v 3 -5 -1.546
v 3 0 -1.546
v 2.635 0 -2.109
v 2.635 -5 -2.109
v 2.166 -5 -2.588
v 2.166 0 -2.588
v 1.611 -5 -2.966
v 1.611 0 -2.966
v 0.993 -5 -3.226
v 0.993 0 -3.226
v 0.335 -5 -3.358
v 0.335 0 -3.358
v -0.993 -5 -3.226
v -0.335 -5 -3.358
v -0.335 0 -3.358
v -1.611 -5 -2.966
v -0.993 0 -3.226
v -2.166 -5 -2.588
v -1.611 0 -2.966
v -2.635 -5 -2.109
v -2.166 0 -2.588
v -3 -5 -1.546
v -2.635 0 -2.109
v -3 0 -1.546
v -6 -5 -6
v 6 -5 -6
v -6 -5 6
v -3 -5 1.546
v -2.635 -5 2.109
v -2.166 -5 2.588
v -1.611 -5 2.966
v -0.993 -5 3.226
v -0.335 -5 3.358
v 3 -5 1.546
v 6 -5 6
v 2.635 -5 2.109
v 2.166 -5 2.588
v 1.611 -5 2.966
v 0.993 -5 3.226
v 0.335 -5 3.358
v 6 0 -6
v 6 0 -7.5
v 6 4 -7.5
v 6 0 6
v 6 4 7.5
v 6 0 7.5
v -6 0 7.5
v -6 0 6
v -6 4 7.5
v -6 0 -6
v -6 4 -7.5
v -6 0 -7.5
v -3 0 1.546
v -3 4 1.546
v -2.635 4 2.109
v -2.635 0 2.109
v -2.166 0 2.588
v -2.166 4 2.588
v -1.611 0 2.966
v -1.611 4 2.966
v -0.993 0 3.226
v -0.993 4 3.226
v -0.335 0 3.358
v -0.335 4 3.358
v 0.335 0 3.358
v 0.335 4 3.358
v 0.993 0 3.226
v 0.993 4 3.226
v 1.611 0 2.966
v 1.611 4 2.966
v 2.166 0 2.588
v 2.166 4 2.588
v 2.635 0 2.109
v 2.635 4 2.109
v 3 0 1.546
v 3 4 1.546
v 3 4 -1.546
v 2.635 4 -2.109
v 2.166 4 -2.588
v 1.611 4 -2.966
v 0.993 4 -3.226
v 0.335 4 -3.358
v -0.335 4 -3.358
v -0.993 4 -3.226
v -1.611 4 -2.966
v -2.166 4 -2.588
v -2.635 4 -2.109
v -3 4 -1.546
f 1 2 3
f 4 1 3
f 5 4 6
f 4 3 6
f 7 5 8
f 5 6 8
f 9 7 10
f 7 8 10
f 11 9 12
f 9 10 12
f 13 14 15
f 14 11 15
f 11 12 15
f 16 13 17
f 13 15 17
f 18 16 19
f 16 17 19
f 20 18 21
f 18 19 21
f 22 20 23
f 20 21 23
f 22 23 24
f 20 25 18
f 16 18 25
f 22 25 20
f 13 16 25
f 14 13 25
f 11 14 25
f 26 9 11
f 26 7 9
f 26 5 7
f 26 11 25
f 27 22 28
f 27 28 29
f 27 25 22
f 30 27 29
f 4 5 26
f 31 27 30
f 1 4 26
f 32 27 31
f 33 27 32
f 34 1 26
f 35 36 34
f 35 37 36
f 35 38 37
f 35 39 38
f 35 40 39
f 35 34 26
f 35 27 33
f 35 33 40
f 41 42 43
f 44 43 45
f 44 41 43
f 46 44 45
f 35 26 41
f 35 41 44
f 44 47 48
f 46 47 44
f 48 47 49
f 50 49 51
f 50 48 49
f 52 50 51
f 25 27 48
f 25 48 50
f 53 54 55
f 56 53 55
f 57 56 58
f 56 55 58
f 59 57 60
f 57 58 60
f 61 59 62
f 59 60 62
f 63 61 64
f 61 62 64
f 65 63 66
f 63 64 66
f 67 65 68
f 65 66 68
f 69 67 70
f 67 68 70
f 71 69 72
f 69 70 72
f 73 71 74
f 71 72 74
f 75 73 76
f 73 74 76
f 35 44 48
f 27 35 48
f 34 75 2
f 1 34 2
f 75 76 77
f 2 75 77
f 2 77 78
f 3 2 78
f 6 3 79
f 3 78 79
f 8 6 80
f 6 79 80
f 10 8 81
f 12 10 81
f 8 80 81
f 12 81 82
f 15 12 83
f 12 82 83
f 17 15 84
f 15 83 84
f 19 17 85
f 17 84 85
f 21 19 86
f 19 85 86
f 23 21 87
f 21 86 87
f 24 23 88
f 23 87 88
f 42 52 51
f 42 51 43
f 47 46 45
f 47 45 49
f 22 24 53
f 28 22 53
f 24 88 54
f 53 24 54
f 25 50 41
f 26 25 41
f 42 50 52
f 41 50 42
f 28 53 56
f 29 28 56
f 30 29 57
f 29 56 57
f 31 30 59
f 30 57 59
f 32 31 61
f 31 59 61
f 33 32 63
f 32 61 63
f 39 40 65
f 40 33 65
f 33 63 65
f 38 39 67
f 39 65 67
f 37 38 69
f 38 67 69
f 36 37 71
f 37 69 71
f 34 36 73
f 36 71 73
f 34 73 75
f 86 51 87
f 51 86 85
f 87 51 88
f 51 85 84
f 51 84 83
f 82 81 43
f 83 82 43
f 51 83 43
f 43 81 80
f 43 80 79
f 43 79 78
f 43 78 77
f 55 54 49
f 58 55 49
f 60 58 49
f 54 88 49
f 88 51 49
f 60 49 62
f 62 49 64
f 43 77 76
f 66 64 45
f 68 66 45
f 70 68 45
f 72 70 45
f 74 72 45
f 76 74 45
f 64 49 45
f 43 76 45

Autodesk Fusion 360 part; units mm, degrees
sketch "Sketch1" plane through (0, 0, 0) normal (0, 1, 0) x (1, 0, 0)
  line L0 (6, 6) -> (-6, 6)
  line L1 (-6, 6) -> (-6, -6)
  line L2 (-6, -6) -> (6, -6)
  line L3 (6, -6) -> (6, 6)
  line L4 (6, 6) -> (-6, -6) construction
  line L5 (-6, 6) -> (6, -6) construction
  dimension "d1" = 12
  dimension "d2" = 12
extrude "Extrude1" add sketch "Sketch1" along normal blind 4 makes body 1
sketch "Sketch2" plane through (0, 4, 0) normal (0, 1, 0) x (-1, 0, 0)
  line L0 (-6, 6) -> (-6, -6)
  line L1 (-6, -6) -> (6, -6)
  line L2 (6, -6) -> (6, 6)
  line L3 (6, 6) -> (-6, 6)
  circle A0 centre (0, 0) radius 3.375
  line L4 (-3, -3.5) -> (3, -3.5)
  line L5 (3, -3.5) -> (3, 3.5)
  line L6 (3, 3.5) -> (-3, 3.5)
  line L7 (-3, 3.5) -> (-3, -3.5)
  line L8 (-3, -3.5) -> (3, 3.5) construction
  line L9 (3, -3.5) -> (-3, 3.5) construction
  dimension "d5" = 6.75
  dimension "d6" = 6
  dimension "d7" = 7
extrude "Extrude2" cut sketch "Sketch2" against normal blind 5 contours A0 L5 L7 bodies 1
sketch "Sketch3" plane through (0, 0, 0) normal (0, -1, 0) x (1, 0, 0)
  line L0 (3, 1.5462) -> (3, -1.5462)
  arc A0 (-3, -1.5462) -> (3, -1.5462) centre (0, 0) ccw
  line L1 (-3, -1.5462) -> (-3, 1.5462)
  arc A1 (3, 1.5462) -> (-3, 1.5462) centre (0, 0) ccw
  line L2 (6, -6) -> (6, 6)
  line L3 (6, 6) -> (-6, 6)
  line L4 (-6, 6) -> (-6, -6)
  line L5 (-6, -6) -> (6, -6)
  line L6 (6, 7.5) -> (-6, 7.5)
  line L7 (-6, 7.5) -> (-6, -7.5)
  line L8 (-6, -7.5) -> (6, -7.5)
  line L9 (6, -7.5) -> (6, 7.5)
  line L10 (6, 7.5) -> (-6, -7.5) construction
  line L11 (-6, 7.5) -> (6, -7.5) construction
  dimension "d10" = 12
  dimension "d11" = 15
extrude "Extrude3" add sketch "Sketch3" against normal blind 4 separate body contours L5 L7 L8 L9 | L3 L6 L7 L9 makes body 2 at (2, 1.3333, 6) makes body 3 at (-2, 1.3333, -7.5)
sketch "Sketch4" plane through (0, 0, 0) normal (0, -1, 0) x (1, 0, 0)
  line L0 (3, 1.5462) -> (3, -1.5462)
  arc A0 (-3, -1.5462) -> (3, -1.5462) centre (0, 0) ccw
  line L1 (-3, -1.5462) -> (-3, 1.5462)
  arc A1 (3, 1.5462) -> (-3, 1.5462) centre (0, 0) ccw
  line L2 (6, -6) -> (6, 6)
  line L3 (6, 6) -> (-6, 6)
  line L4 (-6, 6) -> (-6, -6)
  line L5 (-6, -6) -> (6, -6)
  line L6 (6, 6) -> (-6, 6)
  line L7 (-6, 6) -> (-6, -6)
  line L8 (-6, -6) -> (6, -6)
  line L9 (6, -6) -> (6, 6)
  line L10 (6, 6) -> (-6, -6) construction
  line L11 (-6, 6) -> (6, -6) construction
  dimension "d14" = 12
  dimension "d15" = 12
extrude "Extrude4" add sketch "Sketch4" along normal blind 5 bodies 1 2 3
sketch "Sketch5" plane through (0, -5, 0) normal (0, -1, 0) x (1, 0, 0)
  arc A0 (-3, -1.5462) -> (3, -1.5462) centre (0, 0) ccw
  line L0 (-3, -1.5462) -> (-3, 1.5462)
  arc A1 (3, 1.5462) -> (-3, 1.5462) centre (0, 0) ccw
  line L1 (3, 1.5462) -> (3, -1.5462)
  line L2 (6, -6) -> (6, 6)
  line L3 (6, 6) -> (-6, 6)
  line L4 (-6, 6) -> (-6, -6)
  line L5 (-6, -6) -> (6, -6)
  line L6 (5, 5.6) -> (-5, 5.6)
  line L7 (-5, 5.6) -> (-5, -5.6)
  line L8 (-5, -5.6) -> (5, -5.6)
  line L9 (5, -5.6) -> (5, 5.6)
  line L10 (5, 5.6) -> (-5, -5.6) construction
  line L11 (-5, 5.6) -> (5, -5.6) construction
  dimension "d18" = 11.2
